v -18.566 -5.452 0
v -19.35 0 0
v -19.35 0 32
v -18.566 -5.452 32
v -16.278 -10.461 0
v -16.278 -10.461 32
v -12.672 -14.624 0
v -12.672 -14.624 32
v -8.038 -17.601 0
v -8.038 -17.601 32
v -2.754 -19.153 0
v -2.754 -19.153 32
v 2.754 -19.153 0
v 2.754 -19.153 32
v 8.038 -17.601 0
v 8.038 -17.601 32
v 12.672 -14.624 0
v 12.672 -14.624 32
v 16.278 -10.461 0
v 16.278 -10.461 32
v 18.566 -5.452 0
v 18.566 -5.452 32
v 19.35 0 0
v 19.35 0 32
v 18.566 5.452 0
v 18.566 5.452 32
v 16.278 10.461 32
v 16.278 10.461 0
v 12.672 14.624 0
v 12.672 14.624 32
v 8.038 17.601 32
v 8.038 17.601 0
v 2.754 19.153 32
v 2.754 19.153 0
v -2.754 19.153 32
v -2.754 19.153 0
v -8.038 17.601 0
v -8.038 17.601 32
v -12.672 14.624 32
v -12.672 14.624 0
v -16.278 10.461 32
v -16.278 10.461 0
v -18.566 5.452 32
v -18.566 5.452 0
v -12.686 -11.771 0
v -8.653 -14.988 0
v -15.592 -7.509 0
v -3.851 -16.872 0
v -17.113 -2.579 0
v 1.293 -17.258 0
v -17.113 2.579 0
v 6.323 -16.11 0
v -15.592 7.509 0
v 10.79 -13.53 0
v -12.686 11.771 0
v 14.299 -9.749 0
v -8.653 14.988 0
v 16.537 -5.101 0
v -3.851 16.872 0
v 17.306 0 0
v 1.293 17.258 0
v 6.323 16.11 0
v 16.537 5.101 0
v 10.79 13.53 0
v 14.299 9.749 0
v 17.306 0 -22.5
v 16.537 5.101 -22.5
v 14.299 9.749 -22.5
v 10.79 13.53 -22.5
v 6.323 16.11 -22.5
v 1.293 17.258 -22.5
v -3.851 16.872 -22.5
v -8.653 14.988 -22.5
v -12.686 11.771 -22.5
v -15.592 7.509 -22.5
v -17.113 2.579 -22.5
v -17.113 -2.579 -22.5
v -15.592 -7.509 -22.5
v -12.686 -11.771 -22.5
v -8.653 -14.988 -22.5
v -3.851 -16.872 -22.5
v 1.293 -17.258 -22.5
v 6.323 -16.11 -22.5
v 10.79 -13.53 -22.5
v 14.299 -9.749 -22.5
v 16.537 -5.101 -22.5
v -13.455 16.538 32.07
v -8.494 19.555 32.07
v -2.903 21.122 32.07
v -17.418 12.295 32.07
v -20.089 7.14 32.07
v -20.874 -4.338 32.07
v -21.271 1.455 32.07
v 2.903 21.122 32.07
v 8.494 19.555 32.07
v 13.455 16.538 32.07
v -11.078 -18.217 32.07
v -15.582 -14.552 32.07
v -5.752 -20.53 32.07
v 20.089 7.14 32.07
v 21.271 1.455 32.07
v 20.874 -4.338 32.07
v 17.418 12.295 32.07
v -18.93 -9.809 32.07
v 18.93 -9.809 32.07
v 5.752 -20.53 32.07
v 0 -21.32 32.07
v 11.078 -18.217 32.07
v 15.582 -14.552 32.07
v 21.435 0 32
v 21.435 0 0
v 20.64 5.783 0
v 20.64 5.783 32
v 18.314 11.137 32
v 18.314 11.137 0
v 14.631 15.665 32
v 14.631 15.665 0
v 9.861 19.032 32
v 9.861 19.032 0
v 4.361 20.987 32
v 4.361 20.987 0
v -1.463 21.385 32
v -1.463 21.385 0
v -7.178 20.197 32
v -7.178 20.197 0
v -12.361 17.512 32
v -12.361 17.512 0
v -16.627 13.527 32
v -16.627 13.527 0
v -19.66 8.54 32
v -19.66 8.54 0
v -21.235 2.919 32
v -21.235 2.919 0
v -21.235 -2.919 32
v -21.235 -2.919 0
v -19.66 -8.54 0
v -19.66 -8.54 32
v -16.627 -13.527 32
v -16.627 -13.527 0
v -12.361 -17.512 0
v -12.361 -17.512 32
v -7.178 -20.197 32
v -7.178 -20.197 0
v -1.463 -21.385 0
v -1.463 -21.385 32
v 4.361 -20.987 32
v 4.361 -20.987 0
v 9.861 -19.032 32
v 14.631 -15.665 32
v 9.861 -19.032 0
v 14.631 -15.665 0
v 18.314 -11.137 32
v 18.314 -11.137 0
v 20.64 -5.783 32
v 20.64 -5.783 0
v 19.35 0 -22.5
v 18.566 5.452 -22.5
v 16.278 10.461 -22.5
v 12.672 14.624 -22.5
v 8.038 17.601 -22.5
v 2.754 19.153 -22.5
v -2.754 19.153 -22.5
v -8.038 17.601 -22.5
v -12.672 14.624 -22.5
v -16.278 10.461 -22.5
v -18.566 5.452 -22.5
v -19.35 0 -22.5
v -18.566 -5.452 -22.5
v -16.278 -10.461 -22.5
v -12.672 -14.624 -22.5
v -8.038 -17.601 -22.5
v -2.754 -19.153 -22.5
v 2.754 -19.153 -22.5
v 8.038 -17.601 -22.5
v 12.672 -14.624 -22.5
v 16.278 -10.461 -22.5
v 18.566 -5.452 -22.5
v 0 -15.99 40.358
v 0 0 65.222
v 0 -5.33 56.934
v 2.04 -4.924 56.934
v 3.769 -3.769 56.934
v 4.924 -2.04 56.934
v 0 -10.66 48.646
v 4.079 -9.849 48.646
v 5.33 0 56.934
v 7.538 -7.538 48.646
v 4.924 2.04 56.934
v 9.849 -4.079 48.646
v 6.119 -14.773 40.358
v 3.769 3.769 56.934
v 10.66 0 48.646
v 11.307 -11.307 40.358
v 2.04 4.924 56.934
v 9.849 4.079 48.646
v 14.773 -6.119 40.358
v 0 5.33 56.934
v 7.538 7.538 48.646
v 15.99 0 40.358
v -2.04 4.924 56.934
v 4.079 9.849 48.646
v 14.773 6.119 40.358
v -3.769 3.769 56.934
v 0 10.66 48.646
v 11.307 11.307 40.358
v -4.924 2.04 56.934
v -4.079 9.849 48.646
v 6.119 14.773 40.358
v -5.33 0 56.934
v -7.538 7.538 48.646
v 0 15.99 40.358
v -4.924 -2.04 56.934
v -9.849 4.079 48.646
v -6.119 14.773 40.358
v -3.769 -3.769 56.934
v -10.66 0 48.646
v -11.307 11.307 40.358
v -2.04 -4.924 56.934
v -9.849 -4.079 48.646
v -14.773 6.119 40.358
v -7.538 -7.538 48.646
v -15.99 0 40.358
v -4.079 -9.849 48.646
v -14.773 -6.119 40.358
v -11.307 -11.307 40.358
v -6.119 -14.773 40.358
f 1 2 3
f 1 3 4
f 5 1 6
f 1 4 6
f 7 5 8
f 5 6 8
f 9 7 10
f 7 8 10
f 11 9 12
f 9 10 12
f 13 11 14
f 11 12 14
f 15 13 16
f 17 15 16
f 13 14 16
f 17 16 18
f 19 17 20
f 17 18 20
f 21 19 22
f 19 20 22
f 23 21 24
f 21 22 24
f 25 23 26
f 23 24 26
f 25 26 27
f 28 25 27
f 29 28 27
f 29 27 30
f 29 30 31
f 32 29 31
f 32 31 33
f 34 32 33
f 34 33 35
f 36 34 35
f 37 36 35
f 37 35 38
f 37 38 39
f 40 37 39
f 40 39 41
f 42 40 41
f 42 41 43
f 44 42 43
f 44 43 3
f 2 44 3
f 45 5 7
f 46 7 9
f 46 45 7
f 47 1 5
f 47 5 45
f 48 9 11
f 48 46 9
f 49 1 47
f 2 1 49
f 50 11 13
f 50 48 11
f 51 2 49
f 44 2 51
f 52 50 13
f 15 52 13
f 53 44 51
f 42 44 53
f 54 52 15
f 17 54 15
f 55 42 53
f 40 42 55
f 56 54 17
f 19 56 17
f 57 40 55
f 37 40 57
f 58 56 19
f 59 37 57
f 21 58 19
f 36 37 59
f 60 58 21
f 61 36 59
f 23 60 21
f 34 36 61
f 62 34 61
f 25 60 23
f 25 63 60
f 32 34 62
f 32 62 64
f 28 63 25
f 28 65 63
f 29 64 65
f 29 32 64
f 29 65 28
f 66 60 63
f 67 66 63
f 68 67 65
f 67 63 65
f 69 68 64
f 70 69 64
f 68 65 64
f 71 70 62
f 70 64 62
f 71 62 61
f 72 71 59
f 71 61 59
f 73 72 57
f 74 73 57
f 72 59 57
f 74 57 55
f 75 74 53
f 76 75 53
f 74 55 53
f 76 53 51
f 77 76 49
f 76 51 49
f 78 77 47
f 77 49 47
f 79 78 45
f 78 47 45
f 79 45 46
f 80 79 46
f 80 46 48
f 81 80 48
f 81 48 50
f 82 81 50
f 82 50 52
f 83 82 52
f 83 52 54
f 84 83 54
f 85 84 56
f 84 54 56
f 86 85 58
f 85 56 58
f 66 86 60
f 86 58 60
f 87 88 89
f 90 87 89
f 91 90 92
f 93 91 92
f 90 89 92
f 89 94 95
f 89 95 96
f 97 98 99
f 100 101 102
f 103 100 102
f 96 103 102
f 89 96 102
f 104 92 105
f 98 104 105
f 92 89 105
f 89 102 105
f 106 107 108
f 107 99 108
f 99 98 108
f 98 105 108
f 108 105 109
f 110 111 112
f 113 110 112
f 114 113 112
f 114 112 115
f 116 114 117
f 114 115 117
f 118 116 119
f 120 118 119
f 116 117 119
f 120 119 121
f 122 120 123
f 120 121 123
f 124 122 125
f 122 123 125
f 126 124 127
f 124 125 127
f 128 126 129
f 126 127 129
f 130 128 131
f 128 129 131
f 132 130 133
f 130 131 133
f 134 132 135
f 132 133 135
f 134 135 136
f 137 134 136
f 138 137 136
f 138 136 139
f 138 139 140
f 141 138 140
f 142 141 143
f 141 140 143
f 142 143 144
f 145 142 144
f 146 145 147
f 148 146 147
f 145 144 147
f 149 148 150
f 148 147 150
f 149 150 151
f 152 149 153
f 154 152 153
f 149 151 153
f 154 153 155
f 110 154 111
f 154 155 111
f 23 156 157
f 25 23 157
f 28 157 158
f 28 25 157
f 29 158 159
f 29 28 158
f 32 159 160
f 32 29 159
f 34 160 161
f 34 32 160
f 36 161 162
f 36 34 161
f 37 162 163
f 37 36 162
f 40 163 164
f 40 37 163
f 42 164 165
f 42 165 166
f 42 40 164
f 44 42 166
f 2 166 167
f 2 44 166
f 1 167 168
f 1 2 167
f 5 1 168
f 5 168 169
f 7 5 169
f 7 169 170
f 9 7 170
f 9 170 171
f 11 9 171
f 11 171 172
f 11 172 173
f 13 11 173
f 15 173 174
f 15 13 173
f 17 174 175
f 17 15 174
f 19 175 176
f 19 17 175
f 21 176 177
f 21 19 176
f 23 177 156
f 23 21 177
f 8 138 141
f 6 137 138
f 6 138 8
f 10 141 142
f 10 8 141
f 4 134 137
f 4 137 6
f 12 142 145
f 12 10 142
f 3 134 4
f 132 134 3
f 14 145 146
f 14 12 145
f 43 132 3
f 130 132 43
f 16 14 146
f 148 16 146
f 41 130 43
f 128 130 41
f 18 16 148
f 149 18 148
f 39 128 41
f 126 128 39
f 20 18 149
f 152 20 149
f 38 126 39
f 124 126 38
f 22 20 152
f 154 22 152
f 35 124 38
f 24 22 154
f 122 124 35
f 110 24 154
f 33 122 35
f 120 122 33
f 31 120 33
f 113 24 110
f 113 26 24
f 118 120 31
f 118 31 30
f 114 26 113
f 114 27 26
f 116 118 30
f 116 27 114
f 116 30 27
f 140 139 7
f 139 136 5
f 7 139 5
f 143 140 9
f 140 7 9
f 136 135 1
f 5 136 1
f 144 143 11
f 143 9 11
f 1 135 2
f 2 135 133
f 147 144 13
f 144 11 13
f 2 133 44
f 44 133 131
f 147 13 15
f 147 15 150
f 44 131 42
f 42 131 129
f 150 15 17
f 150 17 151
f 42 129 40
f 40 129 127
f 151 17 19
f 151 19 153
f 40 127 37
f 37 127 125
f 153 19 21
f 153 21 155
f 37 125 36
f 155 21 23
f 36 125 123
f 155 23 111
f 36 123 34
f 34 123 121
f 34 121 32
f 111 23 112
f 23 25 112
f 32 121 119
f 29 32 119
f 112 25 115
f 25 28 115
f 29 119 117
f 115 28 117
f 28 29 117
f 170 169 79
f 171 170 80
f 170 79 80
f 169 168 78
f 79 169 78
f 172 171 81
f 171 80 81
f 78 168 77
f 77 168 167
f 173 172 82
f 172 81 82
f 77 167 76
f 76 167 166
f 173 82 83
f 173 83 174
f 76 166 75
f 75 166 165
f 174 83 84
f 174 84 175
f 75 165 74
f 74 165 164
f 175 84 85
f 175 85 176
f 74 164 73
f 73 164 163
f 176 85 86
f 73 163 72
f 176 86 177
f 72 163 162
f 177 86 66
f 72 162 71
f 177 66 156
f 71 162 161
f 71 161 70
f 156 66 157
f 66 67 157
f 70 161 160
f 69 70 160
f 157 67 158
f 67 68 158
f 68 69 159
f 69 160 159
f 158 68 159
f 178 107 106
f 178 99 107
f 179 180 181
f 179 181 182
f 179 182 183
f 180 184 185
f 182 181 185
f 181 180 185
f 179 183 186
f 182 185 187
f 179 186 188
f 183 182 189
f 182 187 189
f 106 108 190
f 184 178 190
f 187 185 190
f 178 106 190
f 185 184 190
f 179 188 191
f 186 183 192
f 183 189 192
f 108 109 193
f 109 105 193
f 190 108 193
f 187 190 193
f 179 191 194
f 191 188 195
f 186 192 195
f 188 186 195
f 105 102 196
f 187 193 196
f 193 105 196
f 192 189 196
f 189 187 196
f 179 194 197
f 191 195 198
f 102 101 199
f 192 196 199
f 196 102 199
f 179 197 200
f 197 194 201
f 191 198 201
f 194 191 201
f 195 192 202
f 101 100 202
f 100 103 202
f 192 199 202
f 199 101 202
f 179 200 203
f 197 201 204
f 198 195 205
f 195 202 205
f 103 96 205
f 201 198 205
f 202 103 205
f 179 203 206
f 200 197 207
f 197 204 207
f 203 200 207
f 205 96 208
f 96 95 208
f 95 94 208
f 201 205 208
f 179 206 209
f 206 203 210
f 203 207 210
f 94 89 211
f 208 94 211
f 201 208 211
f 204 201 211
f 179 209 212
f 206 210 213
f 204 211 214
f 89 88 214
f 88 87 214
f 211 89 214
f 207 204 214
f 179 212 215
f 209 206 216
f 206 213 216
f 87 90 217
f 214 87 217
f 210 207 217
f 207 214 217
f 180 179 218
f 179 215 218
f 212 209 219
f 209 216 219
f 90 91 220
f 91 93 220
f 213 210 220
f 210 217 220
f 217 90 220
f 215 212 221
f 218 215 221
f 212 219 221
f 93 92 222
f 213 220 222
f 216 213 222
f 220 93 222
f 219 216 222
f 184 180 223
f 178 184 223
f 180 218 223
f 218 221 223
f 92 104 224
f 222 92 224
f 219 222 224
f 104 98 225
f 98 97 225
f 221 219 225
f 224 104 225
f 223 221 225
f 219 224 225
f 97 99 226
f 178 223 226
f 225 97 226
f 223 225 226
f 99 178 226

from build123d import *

# Parameters (mm, degrees)
F0_R     = 21.435
F1_DEPTH = 32
F3_D     = 38.7
F7_R     = 19.35
F7_R_2   = 17.306125
F8_DEPTH = 22.5


with BuildPart() as f1:
    # F0 (on Top) → F1 (new body)
    with BuildSketch(Plane.XY):
        Circle(F0_R)
    extrude(amount=F1_DEPTH)

    # F3 (through all)
    with Locations(Plane(origin=(0, 0, 0), x_dir=(1, 0, 0), z_dir=(0, 0, -1))):
        with Locations((0, 0)):
            Hole(F3_D / 2)


with BuildPart() as f6:
    # F5 (on Right) → F6 (revolve)
    with BuildSketch(Plane.YZ):
        Polygon((0, 32.069813), (0, 32.339215), (0, 65.22245), (-21.320432, 32.069813), align=None)
    revolve(axis=Axis((0, 0, 16.295785), (0, 0, 1)))


with BuildPart() as f8:
    # F7 (on Top) → F8 (new body)
    with BuildSketch(Plane.XY):
        Circle(F7_R)
        Circle(F7_R_2, mode=Mode.SUBTRACT)
    extrude(amount=-F8_DEPTH)


solid = Compound([f1.part, f6.part, f8.part])
